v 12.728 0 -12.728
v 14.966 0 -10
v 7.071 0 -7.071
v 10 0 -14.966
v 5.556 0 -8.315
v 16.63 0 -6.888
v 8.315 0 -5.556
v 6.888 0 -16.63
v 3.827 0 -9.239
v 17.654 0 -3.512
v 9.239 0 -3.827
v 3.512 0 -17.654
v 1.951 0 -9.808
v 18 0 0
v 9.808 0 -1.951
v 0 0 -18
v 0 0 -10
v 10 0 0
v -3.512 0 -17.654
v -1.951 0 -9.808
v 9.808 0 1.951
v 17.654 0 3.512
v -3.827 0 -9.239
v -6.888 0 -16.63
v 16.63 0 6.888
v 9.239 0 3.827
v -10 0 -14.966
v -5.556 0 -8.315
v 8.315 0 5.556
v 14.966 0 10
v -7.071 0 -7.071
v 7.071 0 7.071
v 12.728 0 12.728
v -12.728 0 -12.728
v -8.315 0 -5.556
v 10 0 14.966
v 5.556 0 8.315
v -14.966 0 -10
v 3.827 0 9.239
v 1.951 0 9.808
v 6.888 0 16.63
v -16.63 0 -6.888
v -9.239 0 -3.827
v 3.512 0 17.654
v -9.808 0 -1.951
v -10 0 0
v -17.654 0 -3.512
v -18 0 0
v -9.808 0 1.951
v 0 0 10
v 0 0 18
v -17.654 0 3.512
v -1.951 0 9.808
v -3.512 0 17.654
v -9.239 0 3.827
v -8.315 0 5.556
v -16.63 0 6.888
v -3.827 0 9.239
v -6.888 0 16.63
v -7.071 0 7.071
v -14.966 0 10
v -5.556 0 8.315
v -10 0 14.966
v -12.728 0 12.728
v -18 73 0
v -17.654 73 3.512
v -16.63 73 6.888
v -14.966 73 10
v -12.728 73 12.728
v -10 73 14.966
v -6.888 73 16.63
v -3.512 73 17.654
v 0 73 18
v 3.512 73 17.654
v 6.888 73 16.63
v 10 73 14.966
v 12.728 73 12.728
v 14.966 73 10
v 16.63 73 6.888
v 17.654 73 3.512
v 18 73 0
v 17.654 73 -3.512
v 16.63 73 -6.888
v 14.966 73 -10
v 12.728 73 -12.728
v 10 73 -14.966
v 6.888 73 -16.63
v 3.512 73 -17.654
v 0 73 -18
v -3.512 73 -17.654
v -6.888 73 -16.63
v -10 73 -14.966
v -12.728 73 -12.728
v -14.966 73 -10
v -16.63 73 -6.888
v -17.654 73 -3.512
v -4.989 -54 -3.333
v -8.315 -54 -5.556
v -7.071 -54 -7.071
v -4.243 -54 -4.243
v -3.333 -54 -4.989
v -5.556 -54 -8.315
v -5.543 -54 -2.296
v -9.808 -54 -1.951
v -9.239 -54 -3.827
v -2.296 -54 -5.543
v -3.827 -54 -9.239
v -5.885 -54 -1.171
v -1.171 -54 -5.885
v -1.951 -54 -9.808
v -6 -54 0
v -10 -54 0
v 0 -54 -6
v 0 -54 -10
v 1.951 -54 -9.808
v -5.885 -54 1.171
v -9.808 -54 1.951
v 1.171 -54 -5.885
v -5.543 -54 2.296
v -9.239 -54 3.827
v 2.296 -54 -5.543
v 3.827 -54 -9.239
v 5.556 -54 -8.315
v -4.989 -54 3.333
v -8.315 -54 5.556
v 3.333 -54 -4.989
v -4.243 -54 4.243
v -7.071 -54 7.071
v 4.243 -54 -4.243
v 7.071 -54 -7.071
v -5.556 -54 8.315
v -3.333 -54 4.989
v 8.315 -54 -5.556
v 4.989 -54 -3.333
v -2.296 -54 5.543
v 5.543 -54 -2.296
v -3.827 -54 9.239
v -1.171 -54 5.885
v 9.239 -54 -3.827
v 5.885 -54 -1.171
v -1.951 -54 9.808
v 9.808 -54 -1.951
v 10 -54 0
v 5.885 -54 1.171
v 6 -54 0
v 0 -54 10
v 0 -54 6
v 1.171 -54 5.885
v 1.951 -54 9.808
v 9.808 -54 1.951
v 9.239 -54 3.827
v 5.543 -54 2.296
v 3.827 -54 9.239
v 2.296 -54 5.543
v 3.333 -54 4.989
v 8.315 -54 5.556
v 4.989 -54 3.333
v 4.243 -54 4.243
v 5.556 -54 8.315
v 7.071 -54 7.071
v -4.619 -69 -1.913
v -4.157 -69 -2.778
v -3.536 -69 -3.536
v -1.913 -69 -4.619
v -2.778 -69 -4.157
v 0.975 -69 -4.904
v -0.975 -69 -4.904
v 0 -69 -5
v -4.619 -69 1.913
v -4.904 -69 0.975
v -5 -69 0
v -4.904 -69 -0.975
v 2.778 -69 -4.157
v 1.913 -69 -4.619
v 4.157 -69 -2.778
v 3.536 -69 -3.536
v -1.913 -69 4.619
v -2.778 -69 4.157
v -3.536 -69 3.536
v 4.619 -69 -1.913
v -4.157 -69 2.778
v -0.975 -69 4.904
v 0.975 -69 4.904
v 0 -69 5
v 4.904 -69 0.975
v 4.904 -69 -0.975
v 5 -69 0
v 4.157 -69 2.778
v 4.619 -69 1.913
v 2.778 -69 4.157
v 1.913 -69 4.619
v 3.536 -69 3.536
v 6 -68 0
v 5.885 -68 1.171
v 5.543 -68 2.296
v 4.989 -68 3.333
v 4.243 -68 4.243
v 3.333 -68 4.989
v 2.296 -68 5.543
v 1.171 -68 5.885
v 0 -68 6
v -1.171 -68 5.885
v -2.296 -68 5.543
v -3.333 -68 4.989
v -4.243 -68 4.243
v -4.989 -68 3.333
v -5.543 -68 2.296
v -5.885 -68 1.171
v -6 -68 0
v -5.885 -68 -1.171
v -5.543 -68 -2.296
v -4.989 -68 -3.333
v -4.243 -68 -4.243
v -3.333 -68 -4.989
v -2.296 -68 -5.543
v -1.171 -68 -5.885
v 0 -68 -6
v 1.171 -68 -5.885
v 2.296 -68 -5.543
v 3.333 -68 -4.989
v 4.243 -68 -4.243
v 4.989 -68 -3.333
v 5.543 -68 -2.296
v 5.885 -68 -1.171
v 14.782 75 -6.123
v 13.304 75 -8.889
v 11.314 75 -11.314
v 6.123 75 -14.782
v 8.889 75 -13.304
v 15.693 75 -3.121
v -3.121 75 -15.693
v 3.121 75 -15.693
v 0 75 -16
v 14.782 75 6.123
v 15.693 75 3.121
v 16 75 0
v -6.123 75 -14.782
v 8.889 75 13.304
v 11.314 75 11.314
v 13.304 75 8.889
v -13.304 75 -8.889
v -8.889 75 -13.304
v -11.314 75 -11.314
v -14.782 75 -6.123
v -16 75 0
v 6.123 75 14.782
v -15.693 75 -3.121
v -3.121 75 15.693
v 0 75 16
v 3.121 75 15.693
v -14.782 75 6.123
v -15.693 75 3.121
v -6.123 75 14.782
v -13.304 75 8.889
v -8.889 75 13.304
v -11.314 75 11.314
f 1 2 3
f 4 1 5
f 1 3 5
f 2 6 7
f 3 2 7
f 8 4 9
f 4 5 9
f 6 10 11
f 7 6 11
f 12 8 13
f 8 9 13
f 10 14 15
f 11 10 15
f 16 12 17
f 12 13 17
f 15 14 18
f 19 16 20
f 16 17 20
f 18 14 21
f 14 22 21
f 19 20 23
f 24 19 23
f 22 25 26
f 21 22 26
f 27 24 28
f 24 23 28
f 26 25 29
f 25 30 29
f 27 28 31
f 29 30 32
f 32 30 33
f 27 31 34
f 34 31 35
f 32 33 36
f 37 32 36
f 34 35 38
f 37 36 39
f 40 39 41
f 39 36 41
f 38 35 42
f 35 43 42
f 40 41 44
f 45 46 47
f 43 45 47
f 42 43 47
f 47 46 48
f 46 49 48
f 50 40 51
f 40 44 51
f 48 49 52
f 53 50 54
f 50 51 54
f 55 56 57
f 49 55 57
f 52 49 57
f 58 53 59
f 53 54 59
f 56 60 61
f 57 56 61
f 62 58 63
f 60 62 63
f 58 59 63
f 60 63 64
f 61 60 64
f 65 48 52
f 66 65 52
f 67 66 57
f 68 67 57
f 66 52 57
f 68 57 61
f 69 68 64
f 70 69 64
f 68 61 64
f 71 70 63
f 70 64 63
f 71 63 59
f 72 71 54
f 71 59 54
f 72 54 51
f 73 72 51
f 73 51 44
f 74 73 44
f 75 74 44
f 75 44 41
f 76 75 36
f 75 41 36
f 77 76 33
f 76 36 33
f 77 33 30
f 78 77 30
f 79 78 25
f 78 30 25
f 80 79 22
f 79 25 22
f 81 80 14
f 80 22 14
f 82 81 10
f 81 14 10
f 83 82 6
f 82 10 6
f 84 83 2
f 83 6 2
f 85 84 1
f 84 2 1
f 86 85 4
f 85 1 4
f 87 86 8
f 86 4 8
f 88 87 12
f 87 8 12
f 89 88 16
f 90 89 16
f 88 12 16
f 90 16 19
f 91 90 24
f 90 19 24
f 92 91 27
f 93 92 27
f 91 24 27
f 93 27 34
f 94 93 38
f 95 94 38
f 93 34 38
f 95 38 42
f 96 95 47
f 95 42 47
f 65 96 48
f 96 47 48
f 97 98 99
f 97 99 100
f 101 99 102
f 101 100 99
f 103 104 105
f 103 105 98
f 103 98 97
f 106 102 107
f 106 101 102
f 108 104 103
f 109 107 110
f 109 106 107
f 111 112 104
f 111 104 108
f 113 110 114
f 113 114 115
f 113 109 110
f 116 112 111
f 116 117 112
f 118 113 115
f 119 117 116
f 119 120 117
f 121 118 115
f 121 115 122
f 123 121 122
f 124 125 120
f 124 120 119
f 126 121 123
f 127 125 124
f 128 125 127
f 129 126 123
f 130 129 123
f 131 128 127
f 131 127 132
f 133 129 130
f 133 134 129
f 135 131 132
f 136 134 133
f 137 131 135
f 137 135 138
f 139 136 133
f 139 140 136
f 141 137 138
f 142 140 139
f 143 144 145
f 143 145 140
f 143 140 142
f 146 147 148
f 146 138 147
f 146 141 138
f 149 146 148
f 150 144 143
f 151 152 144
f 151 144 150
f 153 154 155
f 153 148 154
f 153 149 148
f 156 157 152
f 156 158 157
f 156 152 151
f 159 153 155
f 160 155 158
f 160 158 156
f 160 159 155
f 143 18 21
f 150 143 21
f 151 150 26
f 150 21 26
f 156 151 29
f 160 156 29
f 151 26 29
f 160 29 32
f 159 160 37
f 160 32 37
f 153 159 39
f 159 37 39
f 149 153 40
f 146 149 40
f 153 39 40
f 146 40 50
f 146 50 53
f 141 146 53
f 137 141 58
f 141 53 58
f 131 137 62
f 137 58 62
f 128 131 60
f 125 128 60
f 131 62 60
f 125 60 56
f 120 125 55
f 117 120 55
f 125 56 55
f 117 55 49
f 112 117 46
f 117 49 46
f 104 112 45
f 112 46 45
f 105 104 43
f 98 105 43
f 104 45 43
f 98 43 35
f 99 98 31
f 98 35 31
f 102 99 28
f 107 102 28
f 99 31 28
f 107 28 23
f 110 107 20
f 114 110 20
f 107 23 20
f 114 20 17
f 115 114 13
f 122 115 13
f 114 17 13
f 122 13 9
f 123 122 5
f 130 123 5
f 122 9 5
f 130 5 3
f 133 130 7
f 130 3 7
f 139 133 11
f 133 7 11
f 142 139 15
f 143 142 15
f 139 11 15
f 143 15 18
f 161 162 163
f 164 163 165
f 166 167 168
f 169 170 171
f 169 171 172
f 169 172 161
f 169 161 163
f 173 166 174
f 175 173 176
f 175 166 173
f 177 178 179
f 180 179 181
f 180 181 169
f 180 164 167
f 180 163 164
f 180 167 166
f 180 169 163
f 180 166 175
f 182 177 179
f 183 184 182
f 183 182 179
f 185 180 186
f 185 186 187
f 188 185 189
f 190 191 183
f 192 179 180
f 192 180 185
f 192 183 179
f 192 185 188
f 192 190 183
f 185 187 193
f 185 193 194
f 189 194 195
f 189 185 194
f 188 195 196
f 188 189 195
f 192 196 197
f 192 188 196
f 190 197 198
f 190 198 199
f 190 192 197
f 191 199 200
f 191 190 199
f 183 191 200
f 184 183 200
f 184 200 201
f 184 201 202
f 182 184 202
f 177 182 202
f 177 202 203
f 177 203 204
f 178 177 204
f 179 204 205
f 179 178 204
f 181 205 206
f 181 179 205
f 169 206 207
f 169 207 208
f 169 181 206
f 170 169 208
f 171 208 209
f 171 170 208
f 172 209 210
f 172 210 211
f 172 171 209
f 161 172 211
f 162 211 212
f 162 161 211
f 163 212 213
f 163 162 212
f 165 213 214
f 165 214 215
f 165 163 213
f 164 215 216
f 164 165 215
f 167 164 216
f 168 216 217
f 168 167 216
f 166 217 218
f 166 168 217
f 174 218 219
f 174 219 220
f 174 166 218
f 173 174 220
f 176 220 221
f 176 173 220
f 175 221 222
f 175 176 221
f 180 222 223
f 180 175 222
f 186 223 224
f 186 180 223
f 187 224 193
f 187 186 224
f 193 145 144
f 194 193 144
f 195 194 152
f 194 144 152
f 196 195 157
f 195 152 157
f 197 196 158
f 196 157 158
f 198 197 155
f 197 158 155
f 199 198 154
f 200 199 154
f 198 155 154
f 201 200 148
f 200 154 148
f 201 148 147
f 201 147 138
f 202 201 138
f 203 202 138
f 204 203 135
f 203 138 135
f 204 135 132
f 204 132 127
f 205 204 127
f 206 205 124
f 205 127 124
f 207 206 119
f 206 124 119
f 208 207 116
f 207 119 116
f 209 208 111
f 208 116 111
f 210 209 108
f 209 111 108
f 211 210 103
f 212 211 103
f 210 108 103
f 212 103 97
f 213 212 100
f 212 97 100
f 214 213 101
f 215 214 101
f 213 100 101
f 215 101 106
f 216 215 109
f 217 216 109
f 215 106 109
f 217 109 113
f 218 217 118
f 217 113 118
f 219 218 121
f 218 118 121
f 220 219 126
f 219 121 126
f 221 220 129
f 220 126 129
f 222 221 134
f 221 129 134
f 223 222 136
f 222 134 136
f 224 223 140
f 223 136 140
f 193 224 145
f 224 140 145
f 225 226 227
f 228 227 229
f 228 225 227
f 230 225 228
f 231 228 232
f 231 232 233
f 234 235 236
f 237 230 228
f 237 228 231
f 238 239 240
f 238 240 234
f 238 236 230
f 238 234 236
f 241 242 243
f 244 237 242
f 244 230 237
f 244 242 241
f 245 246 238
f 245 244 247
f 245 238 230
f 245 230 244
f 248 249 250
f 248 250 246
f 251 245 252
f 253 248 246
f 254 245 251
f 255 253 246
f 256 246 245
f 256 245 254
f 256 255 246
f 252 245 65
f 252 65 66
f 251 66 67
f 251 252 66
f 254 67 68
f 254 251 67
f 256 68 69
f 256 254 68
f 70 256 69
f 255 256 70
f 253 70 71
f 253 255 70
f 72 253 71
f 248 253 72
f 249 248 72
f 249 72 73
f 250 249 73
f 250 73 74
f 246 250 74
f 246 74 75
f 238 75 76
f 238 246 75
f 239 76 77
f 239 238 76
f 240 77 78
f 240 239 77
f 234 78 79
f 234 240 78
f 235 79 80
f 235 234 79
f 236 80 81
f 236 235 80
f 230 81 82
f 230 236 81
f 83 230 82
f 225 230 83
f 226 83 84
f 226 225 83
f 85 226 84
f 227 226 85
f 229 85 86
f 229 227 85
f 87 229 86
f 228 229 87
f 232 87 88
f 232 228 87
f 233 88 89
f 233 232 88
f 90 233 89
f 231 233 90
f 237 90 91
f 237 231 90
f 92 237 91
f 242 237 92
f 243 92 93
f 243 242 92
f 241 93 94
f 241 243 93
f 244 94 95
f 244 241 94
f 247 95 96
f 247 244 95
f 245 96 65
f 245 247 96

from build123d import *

# Parameters (mm, degrees)
F0_R     = 10
F1_DEPTH = 54
F2_R     = 6
F3_DEPTH = 15
F4_R     = 18
F5_DEPTH = 75
F6_SIZE  = 2
F7_SIZE  = 1


with BuildPart() as f1:
    # F0 (on Front) → F1 (new body)
    with BuildSketch(Plane.XZ):
        Circle(F0_R)
    extrude(amount=F1_DEPTH)

    # F2 (on face) → F3 (join)
    with BuildSketch(Plane.XZ.offset(54)):
        Circle(F2_R)
    extrude(amount=F3_DEPTH)

    # F4 (on face) → F5 (join)
    with BuildSketch(Plane(origin=(0, 0, 0), x_dir=(-1, 0, 0), z_dir=(0, 1, 0))):
        Circle(F4_R)
    extrude(amount=F5_DEPTH)

    # F6
    f6_edges = [f1.edges().sort_by_distance(p)[0] for p in [
        (18, 75, 0),
    ]]
    chamfer(f6_edges, length=F6_SIZE)

    # F7
    f7_edges = [f1.edges().sort_by_distance(p)[0] for p in [
        (-6, -69, 0),
    ]]
    chamfer(f7_edges, length=F7_SIZE)


solid = f1.part
